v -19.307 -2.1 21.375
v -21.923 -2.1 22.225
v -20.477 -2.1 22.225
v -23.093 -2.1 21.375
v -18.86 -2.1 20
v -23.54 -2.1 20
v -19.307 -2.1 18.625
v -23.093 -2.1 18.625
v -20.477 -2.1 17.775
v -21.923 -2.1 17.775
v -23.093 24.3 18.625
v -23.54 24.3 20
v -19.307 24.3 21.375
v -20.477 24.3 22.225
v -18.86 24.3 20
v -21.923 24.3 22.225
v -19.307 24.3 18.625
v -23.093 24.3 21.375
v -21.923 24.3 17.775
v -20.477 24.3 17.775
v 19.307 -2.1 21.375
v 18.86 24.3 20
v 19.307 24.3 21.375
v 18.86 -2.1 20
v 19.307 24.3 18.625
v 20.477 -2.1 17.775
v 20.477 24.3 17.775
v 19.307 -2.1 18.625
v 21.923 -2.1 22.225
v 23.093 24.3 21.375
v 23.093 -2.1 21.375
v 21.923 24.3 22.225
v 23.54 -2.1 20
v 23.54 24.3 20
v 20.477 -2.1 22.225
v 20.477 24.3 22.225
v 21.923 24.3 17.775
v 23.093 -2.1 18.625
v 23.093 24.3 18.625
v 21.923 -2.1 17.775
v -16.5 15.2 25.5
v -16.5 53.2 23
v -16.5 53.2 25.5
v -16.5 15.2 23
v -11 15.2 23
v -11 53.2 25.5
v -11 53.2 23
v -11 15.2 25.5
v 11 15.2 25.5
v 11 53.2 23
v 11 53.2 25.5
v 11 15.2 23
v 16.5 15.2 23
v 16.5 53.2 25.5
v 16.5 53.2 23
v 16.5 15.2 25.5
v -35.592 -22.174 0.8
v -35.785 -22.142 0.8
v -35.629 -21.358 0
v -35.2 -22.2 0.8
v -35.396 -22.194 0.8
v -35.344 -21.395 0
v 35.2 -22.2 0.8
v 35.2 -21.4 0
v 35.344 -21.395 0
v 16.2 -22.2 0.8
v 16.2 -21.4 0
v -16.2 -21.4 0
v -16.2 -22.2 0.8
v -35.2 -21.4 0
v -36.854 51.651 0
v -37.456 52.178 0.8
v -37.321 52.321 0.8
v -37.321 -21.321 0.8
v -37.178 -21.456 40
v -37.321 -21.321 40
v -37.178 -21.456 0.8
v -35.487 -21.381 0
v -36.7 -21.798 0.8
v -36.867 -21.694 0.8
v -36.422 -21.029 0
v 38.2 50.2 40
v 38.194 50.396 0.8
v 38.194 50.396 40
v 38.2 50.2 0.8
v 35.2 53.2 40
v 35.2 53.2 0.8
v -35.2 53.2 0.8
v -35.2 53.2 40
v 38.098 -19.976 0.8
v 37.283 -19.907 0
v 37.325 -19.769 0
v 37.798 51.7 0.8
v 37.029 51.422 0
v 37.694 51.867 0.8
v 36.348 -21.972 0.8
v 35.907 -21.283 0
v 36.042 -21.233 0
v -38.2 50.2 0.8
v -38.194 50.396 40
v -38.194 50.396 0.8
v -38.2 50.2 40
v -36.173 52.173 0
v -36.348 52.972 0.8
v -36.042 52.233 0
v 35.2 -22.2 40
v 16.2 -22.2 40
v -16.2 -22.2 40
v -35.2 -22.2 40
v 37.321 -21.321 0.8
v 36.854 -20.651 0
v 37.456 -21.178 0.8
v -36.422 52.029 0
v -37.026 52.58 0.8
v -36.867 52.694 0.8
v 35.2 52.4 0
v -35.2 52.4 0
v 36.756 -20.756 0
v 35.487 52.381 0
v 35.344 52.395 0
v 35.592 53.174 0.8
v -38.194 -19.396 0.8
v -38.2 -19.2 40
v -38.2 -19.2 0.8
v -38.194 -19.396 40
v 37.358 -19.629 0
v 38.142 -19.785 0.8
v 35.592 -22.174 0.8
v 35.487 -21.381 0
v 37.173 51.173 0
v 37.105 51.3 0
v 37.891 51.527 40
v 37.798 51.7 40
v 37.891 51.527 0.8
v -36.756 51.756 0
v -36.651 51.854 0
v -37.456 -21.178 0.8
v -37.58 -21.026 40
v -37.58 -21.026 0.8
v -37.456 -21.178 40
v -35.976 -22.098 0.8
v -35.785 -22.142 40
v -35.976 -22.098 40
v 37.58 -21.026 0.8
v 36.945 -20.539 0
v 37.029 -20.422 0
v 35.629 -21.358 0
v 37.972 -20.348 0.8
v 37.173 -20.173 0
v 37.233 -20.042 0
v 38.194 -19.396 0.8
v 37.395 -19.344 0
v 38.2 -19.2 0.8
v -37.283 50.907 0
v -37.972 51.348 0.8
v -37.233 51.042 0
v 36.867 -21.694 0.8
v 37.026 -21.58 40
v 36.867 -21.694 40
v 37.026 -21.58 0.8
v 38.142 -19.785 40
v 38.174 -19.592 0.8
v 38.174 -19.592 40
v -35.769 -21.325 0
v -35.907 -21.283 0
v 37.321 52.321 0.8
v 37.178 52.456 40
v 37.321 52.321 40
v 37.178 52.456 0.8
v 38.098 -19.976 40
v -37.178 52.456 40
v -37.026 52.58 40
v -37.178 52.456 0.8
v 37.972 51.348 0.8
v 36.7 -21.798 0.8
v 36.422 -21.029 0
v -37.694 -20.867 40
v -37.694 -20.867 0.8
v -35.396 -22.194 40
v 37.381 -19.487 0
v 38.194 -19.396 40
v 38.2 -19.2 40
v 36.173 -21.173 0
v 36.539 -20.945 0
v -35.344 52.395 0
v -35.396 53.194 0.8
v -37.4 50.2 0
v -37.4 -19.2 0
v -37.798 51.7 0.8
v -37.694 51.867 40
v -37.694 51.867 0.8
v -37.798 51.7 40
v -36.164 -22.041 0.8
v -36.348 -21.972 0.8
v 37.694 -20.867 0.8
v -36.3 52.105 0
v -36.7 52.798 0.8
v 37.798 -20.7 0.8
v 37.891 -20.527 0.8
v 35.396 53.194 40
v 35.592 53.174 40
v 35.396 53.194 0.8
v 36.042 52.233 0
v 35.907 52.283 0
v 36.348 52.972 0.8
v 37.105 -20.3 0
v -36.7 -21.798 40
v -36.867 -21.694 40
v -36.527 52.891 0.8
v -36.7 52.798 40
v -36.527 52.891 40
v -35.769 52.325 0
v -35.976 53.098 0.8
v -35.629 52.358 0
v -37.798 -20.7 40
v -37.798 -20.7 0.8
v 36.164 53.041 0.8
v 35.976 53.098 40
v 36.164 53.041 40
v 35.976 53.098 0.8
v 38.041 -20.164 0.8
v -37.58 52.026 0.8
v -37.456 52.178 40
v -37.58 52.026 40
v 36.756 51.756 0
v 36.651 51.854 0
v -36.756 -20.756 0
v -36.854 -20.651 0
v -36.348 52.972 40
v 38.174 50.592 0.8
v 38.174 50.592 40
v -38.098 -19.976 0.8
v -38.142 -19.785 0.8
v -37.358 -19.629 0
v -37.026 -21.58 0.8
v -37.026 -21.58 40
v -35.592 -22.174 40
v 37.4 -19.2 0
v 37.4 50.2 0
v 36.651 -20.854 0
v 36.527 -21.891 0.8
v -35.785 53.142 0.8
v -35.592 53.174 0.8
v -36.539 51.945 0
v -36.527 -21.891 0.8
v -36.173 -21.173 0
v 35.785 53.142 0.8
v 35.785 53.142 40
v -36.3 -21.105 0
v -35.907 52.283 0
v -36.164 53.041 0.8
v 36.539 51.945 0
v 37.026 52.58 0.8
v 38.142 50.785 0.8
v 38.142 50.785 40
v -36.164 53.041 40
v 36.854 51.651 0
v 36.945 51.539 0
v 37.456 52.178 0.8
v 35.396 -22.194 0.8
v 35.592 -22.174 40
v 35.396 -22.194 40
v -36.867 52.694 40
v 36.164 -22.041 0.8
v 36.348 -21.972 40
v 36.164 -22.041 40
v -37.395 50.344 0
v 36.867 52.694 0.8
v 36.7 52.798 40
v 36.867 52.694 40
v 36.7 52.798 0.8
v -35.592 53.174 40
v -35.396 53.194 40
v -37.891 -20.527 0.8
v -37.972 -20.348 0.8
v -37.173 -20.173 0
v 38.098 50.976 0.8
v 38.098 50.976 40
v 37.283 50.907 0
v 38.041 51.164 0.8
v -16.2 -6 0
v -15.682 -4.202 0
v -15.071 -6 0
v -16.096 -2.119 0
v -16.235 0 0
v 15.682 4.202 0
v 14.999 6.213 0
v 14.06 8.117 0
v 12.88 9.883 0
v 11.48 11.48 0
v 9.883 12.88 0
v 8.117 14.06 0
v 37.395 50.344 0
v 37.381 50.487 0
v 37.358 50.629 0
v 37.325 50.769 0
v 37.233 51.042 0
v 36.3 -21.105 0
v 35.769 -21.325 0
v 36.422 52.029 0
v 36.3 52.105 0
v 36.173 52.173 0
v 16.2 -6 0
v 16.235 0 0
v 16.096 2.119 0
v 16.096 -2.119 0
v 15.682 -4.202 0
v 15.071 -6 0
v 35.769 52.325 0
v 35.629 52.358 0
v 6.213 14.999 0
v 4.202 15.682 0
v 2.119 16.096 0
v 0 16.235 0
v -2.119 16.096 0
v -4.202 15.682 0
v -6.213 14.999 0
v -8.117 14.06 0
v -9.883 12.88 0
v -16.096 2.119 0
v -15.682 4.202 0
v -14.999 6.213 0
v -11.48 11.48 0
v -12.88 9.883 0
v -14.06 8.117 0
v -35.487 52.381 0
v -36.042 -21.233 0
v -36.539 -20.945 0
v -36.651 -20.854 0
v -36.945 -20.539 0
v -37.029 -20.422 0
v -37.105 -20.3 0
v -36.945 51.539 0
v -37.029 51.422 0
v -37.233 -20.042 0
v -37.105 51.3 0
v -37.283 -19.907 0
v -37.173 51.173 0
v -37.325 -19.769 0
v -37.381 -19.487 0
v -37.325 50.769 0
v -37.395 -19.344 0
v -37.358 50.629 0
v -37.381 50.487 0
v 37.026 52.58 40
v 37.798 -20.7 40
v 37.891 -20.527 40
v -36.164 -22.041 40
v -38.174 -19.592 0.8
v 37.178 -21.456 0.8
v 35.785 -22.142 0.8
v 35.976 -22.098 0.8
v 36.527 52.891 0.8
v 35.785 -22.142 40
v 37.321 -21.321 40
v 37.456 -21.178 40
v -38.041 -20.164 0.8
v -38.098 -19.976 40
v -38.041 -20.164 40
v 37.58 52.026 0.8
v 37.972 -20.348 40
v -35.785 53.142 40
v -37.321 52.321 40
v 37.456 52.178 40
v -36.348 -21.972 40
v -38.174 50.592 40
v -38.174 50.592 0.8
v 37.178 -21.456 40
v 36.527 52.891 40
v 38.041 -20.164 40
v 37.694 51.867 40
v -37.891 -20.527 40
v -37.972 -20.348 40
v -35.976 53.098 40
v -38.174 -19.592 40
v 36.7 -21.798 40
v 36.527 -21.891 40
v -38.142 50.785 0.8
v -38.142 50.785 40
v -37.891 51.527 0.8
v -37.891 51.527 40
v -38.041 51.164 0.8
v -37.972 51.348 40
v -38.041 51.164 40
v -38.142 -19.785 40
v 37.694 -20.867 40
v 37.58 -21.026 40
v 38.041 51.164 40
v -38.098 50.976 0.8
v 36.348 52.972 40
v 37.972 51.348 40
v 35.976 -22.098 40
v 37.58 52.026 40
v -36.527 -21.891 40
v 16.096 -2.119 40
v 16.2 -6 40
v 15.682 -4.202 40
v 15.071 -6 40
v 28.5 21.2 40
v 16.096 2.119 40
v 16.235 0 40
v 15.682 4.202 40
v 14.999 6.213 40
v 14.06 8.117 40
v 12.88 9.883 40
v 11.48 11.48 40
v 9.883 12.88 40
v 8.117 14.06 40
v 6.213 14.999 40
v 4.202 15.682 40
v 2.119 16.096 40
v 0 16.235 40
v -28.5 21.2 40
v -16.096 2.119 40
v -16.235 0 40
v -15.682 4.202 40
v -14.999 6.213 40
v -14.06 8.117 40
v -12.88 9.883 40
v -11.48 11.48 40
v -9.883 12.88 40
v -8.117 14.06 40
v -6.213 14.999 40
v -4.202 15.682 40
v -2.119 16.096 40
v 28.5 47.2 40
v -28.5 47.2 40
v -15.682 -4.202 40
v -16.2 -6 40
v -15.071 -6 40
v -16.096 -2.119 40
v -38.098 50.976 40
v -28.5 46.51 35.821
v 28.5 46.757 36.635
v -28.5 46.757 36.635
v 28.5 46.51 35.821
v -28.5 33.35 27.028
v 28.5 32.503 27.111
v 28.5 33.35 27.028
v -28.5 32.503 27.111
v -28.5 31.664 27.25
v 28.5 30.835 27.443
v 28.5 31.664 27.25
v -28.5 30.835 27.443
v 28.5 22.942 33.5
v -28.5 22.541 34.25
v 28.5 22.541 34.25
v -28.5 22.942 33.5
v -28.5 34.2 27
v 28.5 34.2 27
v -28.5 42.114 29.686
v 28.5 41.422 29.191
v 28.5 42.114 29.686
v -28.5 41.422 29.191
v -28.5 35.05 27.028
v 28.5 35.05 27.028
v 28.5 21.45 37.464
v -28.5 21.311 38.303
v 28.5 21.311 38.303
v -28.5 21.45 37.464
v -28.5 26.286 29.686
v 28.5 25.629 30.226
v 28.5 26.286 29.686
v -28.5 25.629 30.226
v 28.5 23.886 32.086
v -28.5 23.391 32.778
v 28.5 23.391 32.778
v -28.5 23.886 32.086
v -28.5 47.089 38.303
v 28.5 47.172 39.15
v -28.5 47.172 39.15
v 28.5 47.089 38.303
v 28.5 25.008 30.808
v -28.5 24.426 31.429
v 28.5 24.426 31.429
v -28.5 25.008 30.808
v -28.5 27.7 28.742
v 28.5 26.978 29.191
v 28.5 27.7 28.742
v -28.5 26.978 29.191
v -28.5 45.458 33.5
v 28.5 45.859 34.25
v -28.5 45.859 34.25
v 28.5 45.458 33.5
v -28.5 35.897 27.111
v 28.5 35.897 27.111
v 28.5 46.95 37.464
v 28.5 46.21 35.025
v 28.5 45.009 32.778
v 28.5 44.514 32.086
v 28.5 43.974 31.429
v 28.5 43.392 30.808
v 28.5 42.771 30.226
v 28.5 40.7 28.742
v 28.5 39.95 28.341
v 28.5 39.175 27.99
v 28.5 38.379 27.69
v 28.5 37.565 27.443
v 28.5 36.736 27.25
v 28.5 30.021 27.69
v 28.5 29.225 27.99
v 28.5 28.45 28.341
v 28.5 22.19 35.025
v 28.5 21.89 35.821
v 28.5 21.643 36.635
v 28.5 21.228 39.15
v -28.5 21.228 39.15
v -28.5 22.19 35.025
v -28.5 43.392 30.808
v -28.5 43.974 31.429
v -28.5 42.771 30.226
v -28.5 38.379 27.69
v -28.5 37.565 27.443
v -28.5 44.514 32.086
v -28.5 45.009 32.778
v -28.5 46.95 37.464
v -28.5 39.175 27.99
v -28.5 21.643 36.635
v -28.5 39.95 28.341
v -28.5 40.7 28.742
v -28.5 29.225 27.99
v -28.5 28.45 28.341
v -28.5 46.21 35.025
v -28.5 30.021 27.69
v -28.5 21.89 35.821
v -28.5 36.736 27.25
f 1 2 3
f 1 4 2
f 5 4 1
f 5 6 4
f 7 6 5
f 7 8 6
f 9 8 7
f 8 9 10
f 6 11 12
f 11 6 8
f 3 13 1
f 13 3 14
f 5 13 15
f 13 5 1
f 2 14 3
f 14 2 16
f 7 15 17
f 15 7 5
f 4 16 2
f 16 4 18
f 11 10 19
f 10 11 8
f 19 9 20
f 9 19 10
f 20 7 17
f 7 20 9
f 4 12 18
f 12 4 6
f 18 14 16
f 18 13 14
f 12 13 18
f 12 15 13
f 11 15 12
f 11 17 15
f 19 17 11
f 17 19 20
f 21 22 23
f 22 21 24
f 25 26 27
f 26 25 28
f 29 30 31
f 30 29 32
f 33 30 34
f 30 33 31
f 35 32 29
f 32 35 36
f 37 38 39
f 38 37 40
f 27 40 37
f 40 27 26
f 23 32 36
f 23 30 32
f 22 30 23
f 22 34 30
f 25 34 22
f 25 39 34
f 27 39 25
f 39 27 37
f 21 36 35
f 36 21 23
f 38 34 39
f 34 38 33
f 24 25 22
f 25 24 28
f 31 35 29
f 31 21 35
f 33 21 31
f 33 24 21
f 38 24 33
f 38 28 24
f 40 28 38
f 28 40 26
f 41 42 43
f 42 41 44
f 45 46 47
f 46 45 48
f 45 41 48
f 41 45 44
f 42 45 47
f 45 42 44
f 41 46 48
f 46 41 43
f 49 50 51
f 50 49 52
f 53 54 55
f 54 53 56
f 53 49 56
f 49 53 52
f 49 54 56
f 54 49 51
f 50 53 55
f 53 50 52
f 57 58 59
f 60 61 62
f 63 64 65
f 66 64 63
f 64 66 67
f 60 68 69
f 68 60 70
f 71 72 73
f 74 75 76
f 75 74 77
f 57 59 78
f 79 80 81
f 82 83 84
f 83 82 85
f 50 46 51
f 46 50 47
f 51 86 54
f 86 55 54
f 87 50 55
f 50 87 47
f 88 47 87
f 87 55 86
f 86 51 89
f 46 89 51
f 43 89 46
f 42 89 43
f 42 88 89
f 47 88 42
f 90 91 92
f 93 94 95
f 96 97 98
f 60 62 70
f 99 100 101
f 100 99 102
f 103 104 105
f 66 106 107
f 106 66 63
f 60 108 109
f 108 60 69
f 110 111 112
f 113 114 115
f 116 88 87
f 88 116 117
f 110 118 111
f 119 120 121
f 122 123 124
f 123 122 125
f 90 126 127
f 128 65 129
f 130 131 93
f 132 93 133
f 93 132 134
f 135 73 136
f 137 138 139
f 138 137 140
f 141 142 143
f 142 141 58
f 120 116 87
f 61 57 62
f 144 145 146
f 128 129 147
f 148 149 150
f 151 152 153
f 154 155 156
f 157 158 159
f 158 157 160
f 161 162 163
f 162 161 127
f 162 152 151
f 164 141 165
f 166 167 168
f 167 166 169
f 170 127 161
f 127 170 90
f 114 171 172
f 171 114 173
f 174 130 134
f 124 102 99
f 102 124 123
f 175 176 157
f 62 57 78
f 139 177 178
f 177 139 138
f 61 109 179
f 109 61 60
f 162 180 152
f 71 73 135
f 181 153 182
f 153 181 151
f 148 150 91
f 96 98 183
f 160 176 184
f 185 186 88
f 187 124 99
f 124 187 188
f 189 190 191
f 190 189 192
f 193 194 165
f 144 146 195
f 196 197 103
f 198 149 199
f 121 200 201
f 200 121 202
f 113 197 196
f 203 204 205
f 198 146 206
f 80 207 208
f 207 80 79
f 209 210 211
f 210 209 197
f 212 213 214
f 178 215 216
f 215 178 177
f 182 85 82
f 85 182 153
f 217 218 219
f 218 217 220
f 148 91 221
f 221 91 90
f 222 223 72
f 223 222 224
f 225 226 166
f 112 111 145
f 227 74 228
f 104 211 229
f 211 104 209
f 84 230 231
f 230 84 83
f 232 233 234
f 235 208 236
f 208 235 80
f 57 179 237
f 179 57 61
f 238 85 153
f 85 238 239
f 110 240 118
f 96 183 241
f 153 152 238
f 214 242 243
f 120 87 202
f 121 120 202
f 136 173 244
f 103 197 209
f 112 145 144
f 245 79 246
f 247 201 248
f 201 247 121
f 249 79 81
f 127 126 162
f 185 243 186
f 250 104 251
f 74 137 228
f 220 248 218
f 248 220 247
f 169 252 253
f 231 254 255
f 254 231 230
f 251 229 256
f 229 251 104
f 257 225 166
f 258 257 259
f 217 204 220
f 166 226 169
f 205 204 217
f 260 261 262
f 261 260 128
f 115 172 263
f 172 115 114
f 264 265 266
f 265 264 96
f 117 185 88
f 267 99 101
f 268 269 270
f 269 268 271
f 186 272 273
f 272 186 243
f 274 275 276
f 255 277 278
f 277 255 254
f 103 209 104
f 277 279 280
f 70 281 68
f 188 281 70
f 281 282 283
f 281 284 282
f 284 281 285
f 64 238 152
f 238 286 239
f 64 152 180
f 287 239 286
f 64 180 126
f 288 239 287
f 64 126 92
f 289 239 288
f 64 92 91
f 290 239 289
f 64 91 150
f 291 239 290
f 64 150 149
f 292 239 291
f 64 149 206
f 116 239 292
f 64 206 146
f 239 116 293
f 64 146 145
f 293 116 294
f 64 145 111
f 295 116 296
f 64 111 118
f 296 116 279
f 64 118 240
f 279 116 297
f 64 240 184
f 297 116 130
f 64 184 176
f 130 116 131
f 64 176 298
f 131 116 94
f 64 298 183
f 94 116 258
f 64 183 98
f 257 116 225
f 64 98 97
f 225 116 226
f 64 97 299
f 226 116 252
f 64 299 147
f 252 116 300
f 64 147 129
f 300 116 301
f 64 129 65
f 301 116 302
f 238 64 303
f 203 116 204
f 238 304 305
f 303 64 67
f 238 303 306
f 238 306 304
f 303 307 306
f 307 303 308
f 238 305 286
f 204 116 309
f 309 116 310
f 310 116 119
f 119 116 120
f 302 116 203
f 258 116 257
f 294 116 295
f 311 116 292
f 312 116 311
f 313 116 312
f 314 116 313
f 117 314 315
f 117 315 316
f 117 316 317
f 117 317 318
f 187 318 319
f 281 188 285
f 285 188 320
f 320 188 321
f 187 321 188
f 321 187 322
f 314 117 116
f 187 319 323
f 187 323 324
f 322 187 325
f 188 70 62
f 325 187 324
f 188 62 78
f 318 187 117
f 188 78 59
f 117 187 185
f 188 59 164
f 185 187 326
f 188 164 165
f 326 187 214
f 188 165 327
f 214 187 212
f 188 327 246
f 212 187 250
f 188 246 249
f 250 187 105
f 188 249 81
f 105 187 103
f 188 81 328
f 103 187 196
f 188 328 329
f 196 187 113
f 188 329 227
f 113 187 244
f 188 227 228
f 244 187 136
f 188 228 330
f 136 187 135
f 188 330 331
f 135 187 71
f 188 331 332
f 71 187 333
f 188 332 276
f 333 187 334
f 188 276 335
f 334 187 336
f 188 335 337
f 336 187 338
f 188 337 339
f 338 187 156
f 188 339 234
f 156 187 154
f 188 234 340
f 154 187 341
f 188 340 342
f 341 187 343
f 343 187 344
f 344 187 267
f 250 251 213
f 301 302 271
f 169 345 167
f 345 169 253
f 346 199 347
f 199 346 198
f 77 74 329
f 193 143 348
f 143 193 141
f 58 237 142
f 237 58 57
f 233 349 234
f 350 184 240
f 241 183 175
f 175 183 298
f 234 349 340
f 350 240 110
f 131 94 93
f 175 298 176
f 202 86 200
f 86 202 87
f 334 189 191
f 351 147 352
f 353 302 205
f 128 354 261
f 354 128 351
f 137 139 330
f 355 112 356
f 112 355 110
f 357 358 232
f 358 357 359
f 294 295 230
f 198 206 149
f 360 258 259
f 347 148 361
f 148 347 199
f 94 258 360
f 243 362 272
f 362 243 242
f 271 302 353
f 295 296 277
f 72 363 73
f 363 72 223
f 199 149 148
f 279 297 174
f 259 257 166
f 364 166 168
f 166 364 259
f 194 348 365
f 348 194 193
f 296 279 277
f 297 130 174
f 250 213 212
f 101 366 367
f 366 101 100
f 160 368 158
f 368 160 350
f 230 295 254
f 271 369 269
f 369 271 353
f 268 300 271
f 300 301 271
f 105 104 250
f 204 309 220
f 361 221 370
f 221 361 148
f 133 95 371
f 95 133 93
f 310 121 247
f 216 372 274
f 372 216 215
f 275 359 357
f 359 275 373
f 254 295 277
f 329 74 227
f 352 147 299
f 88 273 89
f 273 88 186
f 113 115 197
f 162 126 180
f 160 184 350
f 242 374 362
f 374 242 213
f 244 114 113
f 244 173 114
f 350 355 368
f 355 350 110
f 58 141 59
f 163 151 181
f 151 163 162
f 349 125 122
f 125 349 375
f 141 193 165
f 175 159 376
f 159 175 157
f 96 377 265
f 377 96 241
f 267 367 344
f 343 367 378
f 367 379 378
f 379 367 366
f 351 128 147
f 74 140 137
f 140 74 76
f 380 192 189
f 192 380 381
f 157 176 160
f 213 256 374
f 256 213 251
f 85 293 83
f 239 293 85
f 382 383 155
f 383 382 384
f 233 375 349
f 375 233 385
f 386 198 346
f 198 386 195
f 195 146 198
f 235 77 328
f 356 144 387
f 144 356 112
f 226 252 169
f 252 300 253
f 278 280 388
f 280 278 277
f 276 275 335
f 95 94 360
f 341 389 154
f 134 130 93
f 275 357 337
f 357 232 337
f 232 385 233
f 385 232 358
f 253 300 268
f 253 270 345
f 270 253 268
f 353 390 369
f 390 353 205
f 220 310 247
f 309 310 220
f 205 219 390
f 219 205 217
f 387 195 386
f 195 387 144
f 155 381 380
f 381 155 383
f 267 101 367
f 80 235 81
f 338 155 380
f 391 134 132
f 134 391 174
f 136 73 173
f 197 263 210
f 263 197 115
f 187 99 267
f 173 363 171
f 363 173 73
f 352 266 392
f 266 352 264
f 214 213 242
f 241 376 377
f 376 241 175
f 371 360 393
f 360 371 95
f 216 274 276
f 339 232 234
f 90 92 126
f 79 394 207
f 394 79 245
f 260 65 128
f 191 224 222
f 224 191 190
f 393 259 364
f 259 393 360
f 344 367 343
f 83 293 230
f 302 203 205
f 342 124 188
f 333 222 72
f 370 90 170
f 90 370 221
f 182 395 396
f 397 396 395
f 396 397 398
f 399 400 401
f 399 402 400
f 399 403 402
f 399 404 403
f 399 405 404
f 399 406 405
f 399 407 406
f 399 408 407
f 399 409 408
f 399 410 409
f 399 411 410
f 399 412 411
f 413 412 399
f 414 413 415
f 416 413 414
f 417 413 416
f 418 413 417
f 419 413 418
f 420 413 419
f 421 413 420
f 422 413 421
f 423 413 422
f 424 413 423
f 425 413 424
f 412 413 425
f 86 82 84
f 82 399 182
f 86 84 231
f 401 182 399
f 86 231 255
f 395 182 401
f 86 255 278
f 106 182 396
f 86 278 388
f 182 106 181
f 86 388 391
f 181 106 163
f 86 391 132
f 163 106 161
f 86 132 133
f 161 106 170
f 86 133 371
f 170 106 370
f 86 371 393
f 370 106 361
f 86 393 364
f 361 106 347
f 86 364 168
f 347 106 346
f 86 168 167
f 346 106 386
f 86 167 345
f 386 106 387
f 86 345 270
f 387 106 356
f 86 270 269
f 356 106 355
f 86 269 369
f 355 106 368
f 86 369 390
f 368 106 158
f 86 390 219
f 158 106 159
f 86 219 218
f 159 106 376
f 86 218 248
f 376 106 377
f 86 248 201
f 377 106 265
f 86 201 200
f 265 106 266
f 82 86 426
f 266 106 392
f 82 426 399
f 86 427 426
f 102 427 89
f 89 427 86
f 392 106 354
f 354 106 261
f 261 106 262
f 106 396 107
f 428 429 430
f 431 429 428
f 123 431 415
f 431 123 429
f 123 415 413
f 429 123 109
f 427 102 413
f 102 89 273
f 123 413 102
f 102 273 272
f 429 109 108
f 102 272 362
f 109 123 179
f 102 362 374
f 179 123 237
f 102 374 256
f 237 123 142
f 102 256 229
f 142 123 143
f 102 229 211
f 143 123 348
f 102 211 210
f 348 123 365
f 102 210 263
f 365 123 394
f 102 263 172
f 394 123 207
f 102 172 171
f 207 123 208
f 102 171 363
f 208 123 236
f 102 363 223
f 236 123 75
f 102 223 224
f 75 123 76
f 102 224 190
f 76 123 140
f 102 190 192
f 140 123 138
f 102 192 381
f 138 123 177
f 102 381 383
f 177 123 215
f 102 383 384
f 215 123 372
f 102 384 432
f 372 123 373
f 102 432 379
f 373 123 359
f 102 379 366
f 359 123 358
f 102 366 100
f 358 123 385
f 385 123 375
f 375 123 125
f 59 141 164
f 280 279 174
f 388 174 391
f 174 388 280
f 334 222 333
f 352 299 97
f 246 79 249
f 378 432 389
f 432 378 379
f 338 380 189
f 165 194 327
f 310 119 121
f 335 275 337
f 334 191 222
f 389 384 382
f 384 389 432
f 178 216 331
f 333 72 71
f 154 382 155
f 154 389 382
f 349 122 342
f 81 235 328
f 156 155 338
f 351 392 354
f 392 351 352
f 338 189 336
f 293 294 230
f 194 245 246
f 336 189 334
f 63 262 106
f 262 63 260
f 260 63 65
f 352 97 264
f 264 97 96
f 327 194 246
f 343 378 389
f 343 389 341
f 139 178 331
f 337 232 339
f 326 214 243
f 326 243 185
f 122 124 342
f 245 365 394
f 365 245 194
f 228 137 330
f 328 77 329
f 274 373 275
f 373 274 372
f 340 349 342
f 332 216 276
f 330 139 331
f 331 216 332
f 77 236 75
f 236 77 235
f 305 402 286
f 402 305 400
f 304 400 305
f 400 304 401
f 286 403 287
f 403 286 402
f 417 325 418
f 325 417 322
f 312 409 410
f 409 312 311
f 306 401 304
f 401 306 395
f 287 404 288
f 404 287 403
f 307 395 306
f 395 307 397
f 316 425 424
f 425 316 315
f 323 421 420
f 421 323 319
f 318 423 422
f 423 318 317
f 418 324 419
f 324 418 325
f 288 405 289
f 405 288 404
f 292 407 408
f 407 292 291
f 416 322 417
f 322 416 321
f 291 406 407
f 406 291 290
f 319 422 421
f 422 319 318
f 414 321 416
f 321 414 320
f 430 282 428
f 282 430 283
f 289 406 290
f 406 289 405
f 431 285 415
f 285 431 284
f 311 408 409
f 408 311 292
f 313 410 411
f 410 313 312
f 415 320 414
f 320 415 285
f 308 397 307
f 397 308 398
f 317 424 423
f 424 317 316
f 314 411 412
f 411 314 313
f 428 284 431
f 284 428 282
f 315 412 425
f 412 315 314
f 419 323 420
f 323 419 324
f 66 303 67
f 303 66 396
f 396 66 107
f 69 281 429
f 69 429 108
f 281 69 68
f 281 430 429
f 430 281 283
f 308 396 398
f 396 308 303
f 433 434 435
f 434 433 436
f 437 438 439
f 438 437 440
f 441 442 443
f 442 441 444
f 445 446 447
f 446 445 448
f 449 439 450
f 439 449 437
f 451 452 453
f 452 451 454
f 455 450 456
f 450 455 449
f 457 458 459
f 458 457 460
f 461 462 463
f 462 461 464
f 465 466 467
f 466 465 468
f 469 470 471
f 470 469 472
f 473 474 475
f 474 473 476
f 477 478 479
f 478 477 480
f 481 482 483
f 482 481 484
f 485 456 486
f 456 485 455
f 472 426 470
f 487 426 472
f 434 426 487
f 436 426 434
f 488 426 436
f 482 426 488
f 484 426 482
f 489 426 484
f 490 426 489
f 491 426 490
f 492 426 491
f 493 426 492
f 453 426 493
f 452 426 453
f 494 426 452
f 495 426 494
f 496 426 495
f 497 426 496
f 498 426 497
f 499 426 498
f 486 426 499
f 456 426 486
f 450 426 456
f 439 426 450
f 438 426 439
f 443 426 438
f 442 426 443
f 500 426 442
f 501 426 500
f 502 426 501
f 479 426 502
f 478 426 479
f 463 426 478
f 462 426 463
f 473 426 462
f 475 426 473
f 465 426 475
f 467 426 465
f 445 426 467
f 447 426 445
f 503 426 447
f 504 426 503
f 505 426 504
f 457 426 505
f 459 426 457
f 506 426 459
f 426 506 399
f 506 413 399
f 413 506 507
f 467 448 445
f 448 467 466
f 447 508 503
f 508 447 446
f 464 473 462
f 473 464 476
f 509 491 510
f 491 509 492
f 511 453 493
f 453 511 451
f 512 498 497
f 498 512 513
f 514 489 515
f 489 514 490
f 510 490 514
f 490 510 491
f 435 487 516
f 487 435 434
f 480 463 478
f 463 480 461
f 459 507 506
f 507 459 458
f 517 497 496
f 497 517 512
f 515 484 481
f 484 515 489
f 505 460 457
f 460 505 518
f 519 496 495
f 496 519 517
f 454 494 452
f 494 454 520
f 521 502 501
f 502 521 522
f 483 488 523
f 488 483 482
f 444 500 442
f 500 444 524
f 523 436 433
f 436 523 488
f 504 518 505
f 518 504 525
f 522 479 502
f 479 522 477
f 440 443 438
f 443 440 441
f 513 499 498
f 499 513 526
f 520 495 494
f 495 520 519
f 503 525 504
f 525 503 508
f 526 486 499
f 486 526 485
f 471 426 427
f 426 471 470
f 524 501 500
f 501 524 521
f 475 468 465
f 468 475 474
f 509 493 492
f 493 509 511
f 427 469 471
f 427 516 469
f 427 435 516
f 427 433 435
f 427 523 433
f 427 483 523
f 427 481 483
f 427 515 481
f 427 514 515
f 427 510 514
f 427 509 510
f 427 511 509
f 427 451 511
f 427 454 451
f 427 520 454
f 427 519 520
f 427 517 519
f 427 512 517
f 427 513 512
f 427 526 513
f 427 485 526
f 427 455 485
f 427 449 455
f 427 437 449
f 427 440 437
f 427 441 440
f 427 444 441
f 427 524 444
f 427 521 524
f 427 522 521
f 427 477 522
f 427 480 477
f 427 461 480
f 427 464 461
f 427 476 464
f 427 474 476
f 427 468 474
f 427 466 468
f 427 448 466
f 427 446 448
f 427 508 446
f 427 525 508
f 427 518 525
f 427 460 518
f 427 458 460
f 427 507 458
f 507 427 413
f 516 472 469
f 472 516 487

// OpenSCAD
// ============================================================
// AquaBeacon 振動子ポール治具 (TD04A pole jig)
// VP25塩ビポール(縦)にクランプし、TD04Aを水平に保持する。
// 対面測距試験(E1)で送受それぞれのポールに1個ずつ使用。
// part="body"(本体) と part="cap"(クランプ蓋) を個別にエクスポート。
// 印刷向き: どちらも底面(ポール溝と直交の平面)を下にしてそのまま印刷。
// 寸法は要実測: pole_d(実測VP25外径~32mm), xdcr_d/xdcr_len(TD04A実測)
// ============================================================
include <../../../../scad/lib/util.scad>

$fn = 96;

/* [Part selection] */
part = "body";        // [body, cap]

/* [Pole (vertical)] */
pole_d    = 32.4;     // VP25実測外径 + すべり嵌め余裕(要フィットテスト)
clamp_h   = 40;       // ポールを掴む高さ
clamp_gap = 3;        // 本体とキャップの締め代ギャップ(両側合計)

/* [Transducer cradle (horizontal)] */
xdcr_d    = 26.0;     // TD04A胴径(要実測) + 0.5クリアランス
xdcr_len  = 55;       // クレードル長(振動子胴長以下)
tie_w     = 5.5;      // 結束バンド幅(4.8mm帯用)
tie_t     = 2.5;      // 結束バンド厚み穴
tie_n     = 2;        // 結束バンド本数

/* [Structure] */
wall      = 6;        // 主要肉厚
bolt_d    = 4;        // M4クランプボルト
bolt_head = 8;        // M4ナベ頭径
arm_len   = 18;       // ポール中心→クレードル中心の水平距離(短いほど剛)
chamf     = 0.8;      // 底面チャンファ(エレファントフット対策)

// ---- 導出寸法 ----
pole_r    = pole_d/2;
xd_r      = xdcr_d/2;
body_w    = pole_d + 2*wall + 2*(bolt_d+2*wall);   // ボルト耳込み幅
body_d    = pole_r + arm_len + xd_r + wall;        // ポール中心~クレードル外面
body_h    = clamp_h;
bolt_span = pole_d + wall + bolt_d;                // 左右ボルト間隔
cap_t     = wall;                                   // キャップ厚

module bolt_holes(h) {
    for (sx=[-1,1])
        translate([sx*bolt_span/2, 0, -1])
            hole(bolt_d+CLEAR_FIT, h+2, fn=10);
}

// ---------------- 本体 ----------------
module body() {
    difference() {
        union() {
            // ベースブロック(底チャンファ付き、一筆書きの単一footprint)
            translate([-body_w/2, -pole_r-wall, 0])
                box_rounded(body_w, body_d + pole_r + wall, body_h, r=3, chamfer=chamf);
        }
        // ポール縦溝(半円+締め代: キャップ側へ開放)
        translate([0,0,-1]) hole(pole_d, body_h+2, fn=48);
        // 開放スリット(キャップ側): ポール溝~前面を切り欠いてC字にする
        translate([-pole_d/2, -pole_r-wall-1, -1])
            cube([pole_d, pole_r+1, body_h+2]);
        // クランプボルト穴(縦中央に1段)
        translate([0, 0, body_h/2]) rotate([90,0,0])
            translate([0,0,-(pole_r+wall+1)]) bolt_holes(pole_r+wall+2);
        // 振動子クレードル溝(水平・上開放の半円樋 → サポート不要)
        translate([0, pole_r+arm_len, body_h])
            rotate([0,90,0])
                cylinder(h=xdcr_len+2, d=xdcr_d, center=true);
        // 結束バンドスロット(クレードル溝の下をくぐる)
        for (i=[0:tie_n-1])
            translate([-xdcr_len/2 + (i+0.5)*xdcr_len/tie_n, pole_r+arm_len, body_h - xd_r - tie_t - 1.5])
                rotate([90,0,0])
                    translate([-tie_w/2, 0, -(xd_r+wall)])
                        cube([tie_w, tie_t, 2*(xd_r+wall)]);
    }
}

// ---------------- クランプ蓋 ----------------
module cap() {
    difference() {
        translate([-body_w/2, 0, 0])
            box_rounded(body_w, wall + clamp_gap, clamp_h, r=3, chamfer=chamf);
        // ポール当たり面(浅い半円で食いつき)
        translate([0, wall+clamp_gap+pole_r-2, -1])
            hole(pole_d, clamp_h+2, fn=48);
        // ボルト貫通穴+頭座グリ
        translate([0, 0, clamp_h/2]) rotate([-90,0,0]) {
            translate([0,0,-1]) bolt_holes(wall+clamp_gap+2);
            for (sx=[-1,1])
                translate([sx*bolt_span/2, 0, -0.01])
                    hole(bolt_head+CLEAR_FIT, 3, fn=12);
        }
    }
}

if (part=="body") body();
else cap();
